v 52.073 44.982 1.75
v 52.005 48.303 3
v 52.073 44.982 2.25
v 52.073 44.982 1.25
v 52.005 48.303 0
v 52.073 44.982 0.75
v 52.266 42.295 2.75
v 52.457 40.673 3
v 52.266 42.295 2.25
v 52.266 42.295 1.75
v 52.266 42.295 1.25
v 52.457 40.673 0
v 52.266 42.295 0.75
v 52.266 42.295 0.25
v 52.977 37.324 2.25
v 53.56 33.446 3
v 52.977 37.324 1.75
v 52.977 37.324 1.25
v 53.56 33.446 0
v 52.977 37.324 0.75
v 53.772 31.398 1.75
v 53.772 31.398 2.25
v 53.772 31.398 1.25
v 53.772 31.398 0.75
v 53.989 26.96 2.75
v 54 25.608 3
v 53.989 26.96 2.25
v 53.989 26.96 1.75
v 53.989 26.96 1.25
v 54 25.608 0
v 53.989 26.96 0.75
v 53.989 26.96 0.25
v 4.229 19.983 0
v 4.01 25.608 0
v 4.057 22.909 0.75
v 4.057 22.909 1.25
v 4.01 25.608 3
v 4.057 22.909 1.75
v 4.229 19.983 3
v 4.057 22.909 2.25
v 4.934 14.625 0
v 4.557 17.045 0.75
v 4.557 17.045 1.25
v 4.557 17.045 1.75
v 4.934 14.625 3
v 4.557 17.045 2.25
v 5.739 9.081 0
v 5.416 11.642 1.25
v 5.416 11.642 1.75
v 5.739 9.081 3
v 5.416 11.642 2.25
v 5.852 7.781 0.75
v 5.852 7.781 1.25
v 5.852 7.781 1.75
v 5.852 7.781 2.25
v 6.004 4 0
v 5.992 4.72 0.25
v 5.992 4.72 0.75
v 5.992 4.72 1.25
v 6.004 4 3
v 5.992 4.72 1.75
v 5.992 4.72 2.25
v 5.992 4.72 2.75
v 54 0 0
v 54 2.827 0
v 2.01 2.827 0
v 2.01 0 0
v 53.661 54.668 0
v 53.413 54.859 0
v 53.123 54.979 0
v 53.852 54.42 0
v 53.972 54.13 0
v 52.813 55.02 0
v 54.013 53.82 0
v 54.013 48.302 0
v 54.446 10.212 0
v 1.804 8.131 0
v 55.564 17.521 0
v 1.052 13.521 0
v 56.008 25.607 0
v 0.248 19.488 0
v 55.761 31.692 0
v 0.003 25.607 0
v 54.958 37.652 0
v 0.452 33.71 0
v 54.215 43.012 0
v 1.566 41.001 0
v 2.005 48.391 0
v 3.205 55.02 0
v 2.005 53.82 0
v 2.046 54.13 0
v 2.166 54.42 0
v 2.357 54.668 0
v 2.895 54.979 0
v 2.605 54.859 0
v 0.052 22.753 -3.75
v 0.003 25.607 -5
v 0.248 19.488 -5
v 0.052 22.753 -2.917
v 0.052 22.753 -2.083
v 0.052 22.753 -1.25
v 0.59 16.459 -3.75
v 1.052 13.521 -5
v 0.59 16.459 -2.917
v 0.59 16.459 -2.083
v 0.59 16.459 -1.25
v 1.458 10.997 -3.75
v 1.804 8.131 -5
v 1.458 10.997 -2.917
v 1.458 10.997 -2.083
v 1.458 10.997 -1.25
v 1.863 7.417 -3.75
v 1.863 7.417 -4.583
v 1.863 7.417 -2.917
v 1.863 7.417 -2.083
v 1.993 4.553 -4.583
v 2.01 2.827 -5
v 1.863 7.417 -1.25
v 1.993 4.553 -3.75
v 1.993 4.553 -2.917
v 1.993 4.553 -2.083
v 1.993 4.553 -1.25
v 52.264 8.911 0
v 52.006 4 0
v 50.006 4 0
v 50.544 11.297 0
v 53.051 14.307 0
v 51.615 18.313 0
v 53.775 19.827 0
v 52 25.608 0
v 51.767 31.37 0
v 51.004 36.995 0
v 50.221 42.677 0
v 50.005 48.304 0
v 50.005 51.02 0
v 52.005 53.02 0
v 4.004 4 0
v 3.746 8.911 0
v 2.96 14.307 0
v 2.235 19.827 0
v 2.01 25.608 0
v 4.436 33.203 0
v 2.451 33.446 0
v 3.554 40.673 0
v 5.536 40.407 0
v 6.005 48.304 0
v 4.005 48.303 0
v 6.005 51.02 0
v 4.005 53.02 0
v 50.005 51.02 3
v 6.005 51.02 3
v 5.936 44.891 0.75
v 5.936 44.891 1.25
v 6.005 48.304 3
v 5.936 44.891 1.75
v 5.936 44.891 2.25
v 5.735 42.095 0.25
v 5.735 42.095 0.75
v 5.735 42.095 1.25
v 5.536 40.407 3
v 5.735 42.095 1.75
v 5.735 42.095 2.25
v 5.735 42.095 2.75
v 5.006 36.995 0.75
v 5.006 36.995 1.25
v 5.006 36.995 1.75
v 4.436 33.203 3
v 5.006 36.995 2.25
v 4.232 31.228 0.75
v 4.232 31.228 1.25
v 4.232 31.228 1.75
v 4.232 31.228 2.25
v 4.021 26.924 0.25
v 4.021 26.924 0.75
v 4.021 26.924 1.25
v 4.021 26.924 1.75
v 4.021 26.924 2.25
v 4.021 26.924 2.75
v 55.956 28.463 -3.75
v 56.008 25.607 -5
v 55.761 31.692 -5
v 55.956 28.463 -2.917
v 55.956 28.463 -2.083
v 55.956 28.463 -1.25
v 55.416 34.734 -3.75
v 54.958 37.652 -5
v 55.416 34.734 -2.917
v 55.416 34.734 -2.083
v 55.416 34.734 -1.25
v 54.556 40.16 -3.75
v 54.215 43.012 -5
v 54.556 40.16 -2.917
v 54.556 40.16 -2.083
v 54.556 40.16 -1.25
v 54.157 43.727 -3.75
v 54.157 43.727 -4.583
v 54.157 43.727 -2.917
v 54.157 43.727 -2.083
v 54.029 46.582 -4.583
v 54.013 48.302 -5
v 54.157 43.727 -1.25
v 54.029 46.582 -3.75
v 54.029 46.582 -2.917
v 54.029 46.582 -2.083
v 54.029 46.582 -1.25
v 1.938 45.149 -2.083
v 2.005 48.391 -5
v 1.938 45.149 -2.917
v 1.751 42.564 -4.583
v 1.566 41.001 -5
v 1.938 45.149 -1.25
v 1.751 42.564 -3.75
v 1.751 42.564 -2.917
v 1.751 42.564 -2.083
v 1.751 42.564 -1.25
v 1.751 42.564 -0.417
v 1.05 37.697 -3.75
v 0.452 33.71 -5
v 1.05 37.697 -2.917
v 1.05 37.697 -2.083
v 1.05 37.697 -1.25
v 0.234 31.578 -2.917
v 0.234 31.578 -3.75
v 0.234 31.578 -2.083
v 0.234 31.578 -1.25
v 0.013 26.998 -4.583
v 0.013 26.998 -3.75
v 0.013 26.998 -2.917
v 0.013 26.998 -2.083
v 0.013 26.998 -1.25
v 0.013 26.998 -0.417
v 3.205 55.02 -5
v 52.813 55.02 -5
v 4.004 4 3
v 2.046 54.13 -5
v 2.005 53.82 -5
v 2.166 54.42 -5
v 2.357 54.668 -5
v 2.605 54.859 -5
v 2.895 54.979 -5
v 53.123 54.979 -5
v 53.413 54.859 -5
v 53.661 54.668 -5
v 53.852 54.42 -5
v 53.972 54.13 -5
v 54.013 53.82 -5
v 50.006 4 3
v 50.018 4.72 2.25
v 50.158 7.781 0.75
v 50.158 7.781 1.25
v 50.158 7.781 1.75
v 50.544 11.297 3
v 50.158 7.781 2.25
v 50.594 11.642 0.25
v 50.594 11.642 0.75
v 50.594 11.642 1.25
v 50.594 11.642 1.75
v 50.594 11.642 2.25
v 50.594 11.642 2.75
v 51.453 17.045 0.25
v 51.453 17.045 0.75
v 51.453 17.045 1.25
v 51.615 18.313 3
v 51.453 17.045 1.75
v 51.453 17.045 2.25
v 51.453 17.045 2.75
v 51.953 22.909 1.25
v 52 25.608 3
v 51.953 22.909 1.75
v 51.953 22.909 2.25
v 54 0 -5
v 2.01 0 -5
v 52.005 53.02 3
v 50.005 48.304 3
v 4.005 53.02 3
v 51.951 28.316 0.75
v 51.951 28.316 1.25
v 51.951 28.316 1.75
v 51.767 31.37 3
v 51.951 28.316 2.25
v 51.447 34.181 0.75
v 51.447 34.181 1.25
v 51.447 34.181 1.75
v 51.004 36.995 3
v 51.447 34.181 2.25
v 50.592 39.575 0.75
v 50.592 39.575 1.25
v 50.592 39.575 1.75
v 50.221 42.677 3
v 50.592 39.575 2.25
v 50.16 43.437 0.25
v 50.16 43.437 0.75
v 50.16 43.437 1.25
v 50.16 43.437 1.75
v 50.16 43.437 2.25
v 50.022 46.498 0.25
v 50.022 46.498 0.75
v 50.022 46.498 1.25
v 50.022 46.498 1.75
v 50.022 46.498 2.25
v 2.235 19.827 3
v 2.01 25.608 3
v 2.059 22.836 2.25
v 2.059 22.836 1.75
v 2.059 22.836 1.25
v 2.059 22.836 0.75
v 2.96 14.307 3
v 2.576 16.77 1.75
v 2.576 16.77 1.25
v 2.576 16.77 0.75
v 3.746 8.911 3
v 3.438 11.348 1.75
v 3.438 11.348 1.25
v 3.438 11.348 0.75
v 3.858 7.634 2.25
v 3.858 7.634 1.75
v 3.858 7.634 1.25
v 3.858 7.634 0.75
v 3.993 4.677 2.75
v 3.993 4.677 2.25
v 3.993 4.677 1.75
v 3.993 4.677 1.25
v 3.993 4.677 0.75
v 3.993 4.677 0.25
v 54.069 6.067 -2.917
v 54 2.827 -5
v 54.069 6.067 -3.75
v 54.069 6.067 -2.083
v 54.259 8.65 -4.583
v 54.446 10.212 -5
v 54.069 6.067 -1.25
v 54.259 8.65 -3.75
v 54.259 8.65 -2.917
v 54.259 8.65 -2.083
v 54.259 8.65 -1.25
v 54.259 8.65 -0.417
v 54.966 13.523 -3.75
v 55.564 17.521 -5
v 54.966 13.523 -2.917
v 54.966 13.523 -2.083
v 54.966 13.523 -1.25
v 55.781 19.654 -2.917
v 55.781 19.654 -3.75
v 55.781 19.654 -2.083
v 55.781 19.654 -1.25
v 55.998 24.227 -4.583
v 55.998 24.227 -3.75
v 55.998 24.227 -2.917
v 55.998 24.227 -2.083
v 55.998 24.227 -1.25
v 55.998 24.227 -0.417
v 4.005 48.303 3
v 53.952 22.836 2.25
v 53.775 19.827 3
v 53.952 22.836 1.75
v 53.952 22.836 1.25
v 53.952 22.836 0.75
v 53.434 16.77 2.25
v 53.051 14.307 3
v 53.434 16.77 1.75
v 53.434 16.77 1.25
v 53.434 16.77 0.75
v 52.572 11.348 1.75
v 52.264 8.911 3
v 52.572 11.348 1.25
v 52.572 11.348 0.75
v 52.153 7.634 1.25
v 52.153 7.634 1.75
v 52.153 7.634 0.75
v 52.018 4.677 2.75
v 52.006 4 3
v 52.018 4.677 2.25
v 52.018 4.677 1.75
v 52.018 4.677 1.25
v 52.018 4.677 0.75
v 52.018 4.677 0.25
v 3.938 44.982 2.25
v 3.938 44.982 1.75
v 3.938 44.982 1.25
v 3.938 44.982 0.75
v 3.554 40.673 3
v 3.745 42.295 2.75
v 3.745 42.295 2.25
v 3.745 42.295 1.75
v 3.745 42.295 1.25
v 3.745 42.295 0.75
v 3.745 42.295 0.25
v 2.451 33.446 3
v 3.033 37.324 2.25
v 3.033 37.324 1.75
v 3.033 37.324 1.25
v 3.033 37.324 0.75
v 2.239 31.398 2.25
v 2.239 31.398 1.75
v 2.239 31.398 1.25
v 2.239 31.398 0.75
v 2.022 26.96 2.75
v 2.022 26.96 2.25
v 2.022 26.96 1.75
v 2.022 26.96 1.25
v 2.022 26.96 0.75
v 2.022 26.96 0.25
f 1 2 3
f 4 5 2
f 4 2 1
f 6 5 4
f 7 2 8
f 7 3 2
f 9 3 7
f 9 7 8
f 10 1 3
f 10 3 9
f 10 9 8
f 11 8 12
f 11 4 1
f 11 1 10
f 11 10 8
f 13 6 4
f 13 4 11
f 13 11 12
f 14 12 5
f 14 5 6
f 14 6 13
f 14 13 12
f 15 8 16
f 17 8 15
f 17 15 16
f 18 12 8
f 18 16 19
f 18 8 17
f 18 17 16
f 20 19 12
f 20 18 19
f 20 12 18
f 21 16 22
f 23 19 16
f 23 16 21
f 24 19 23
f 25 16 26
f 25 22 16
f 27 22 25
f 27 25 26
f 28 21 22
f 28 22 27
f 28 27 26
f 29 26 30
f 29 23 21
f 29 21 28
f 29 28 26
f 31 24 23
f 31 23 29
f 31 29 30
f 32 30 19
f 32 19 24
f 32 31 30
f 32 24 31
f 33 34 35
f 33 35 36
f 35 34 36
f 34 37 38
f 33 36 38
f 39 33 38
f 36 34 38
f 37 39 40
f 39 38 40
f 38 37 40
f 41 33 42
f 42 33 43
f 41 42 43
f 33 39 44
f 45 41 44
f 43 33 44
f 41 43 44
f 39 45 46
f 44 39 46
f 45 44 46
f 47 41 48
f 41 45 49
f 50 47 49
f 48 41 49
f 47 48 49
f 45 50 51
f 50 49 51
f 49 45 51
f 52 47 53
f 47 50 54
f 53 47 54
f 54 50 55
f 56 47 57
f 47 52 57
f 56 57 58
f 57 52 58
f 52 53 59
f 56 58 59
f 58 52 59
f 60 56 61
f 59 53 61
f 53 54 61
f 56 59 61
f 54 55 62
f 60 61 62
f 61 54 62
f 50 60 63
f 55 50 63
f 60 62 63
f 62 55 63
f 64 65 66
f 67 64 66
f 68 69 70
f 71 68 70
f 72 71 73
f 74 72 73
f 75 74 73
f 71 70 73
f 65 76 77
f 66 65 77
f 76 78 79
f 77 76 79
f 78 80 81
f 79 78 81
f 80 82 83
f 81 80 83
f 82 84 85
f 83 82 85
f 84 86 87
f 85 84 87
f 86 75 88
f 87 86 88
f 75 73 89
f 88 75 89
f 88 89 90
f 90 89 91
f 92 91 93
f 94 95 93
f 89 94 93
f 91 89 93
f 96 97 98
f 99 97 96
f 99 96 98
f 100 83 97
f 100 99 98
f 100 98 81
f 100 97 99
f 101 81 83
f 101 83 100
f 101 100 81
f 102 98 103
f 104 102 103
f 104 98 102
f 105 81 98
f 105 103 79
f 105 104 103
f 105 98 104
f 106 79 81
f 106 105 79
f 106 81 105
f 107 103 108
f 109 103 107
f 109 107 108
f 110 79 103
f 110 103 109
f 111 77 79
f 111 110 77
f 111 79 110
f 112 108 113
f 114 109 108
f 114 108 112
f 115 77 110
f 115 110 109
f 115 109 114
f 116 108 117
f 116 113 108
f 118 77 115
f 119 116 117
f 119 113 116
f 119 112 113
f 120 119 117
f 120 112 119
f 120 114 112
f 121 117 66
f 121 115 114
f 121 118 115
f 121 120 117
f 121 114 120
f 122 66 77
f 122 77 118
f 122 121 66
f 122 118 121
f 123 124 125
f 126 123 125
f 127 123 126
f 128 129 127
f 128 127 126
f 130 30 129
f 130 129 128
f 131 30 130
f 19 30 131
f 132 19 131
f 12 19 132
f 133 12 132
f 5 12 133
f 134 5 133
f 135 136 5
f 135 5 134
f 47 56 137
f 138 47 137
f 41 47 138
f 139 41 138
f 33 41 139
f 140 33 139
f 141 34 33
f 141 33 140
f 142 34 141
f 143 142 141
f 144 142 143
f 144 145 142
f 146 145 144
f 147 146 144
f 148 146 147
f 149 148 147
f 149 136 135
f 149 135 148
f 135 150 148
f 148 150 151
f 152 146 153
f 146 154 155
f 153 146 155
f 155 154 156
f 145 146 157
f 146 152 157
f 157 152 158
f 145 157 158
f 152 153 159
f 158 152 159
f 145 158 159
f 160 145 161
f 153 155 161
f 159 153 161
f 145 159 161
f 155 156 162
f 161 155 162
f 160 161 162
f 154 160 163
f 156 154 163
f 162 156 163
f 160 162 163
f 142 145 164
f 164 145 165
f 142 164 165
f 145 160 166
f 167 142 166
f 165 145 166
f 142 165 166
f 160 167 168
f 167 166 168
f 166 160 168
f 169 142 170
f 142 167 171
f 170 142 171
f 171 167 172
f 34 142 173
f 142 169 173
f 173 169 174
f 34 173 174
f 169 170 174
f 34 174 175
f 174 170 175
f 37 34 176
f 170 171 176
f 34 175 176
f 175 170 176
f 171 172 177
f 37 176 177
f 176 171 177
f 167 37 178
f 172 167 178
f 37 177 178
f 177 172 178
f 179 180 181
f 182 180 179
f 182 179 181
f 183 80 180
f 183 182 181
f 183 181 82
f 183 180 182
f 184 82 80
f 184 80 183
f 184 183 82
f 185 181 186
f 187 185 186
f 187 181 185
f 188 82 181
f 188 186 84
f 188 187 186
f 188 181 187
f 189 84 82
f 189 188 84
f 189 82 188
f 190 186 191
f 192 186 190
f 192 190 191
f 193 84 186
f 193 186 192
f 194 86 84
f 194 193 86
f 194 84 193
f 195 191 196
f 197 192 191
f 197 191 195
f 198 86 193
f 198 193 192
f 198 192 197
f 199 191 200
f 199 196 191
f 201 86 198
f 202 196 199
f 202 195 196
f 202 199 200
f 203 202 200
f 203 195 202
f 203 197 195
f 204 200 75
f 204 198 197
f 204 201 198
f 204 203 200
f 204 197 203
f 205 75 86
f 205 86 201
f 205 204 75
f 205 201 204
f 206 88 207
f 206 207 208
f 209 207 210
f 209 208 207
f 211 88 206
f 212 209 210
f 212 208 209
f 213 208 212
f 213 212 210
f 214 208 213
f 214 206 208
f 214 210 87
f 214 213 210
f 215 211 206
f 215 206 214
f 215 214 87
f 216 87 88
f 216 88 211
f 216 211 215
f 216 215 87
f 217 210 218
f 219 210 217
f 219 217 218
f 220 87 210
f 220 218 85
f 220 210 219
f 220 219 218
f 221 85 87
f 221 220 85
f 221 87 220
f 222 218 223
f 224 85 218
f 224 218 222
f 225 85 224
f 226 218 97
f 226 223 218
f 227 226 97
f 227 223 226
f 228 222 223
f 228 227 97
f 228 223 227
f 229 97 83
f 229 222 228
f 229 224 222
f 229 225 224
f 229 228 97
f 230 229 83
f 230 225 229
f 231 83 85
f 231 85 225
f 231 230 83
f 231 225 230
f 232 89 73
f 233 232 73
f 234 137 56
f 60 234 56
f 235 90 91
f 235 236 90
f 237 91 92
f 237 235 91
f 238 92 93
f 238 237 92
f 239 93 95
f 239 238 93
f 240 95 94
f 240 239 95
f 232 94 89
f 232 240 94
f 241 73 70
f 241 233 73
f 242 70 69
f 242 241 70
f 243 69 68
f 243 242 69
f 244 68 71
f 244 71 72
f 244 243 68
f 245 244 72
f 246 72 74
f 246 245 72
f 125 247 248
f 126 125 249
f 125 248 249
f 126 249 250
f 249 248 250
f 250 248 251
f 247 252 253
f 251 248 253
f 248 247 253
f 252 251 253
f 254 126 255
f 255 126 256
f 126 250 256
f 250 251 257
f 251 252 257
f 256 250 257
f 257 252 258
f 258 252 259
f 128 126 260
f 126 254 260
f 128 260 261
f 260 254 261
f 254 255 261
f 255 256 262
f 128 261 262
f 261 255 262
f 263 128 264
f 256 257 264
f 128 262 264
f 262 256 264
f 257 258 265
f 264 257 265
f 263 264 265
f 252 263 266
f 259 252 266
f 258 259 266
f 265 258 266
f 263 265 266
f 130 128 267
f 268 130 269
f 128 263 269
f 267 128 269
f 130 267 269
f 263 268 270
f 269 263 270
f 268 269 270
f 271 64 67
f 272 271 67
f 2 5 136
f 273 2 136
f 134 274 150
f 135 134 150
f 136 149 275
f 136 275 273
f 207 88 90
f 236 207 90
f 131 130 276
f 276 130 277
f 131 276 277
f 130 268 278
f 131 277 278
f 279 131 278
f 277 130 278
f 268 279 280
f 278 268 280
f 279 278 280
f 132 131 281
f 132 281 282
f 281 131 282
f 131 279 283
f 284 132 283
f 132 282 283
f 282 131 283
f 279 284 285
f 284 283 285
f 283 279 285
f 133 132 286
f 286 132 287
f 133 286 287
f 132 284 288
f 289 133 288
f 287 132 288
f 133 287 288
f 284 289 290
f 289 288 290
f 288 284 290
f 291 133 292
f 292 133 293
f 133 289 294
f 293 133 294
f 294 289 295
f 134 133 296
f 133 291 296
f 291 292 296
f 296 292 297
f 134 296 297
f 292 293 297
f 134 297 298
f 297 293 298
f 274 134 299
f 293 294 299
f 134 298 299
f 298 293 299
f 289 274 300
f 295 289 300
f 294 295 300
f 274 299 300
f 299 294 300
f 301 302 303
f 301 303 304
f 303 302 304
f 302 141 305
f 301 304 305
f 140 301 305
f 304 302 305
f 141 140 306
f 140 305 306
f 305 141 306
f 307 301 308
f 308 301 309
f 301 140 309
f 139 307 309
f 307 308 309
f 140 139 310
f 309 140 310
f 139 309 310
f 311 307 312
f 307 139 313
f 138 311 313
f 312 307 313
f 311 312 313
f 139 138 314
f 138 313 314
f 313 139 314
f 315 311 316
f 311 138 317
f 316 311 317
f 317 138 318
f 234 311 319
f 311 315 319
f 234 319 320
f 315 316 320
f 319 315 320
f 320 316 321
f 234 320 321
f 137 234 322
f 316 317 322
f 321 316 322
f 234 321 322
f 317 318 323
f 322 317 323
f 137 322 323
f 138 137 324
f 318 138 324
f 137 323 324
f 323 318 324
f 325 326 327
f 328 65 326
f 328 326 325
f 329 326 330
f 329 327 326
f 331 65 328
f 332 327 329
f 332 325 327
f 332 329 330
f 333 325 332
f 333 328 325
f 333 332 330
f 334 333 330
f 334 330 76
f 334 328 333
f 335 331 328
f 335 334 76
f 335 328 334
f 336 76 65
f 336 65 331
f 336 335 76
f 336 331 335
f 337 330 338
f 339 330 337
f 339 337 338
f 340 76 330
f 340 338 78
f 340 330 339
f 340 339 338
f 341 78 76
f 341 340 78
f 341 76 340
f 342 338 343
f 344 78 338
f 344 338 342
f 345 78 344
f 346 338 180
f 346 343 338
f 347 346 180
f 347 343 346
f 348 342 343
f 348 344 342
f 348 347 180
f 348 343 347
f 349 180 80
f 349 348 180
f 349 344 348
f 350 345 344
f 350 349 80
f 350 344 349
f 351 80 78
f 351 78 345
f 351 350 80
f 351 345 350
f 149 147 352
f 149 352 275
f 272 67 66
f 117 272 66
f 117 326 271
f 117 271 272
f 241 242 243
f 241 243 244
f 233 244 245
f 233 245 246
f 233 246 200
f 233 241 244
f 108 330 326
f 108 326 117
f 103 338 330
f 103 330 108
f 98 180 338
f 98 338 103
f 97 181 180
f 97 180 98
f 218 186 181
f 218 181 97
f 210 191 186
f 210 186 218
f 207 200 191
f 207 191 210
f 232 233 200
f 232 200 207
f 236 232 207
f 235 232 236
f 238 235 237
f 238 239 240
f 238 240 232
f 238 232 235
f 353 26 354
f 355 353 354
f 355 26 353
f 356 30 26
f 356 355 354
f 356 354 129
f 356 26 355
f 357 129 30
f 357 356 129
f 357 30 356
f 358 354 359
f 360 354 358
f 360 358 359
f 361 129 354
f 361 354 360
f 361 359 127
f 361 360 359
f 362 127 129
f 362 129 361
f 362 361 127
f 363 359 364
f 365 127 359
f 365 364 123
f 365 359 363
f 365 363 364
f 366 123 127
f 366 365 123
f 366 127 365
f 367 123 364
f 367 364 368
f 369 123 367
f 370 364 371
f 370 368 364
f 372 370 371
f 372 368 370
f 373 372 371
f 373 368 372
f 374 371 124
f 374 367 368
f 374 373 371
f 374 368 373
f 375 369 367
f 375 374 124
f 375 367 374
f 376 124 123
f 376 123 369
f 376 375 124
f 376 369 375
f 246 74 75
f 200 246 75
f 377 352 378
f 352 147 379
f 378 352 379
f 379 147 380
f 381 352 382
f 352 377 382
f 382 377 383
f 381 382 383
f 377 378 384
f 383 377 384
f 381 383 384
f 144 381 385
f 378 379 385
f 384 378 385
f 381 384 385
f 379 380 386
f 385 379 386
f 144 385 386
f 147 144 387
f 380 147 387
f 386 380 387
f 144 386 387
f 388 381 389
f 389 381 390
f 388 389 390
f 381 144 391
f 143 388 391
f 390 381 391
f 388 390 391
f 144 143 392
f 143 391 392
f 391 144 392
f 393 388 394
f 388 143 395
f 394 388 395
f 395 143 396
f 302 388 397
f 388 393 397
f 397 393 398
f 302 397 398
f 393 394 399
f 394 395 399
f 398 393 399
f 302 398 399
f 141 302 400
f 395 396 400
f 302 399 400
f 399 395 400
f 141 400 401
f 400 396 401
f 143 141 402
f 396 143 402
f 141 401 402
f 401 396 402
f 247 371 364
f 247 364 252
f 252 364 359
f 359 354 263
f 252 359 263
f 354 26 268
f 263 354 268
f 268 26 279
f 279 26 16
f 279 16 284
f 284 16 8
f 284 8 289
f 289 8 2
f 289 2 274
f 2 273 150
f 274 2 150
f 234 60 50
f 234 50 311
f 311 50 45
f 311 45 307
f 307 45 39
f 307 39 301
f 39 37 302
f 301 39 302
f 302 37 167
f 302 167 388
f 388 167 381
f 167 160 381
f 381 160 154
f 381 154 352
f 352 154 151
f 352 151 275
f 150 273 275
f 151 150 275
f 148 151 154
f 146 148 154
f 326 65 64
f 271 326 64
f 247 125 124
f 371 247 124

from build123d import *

# Parameters (mm, degrees)
BOSS_EXTRUDE1_DEPTH = 3
BOSS_EXTRUDE2_DEPTH = 5
FILLET7_R           = 1.2
CUT_EXTRUDE1_DEPTH  = 3
SKETCH9_W           = 49.989585209
SKETCH9_H           = 4
CUT_EXTRUDE2_DEPTH  = 3


with BuildPart() as part:
    # Sketch1 → Boss-Extrude1 (new body)
    with BuildSketch(Plane.XY):
        with BuildLine():
            Line((28.005207395, 53.01980246), (28.005207395, 0))
            Line((28.005207395, 0), (52, 0))
            Line((52, 0), (52, 2.9146477))
            add(Edge.make_bspline(
                [(54, 25.607527289), (54, 25.159169522), (53.994288647, 24.283360938), (53.944437462, 22.364816973), (53.80644817, 19.846772797), (53.457239701, 16.735076854), (52.97052622, 13.830588939), (52.553998709, 11.322953348), (52.298218213, 9.357304832), (52.147846123, 7.65276951), (52.064355406, 6.263182374), (52.020871116, 4.967378593), (52.003043675, 3.838316022), (52, 3.217882336), (52, 2.9146477)],
                knots=[0, 0, 0, 0, 0.062770413, 0.125540826, 0.251081651, 0.376622477, 0.502163302, 0.627704128, 0.753244954, 0.816015366, 0.878785779, 0.941556192, 0.972941398, 1.004326605, 1.004326605, 1.004326605, 1.004326605], degree=3))
            add(Edge.make_bspline(
                [(52.005207395, 48.302981133), (52.005032478, 47.999820298), (52.007704017, 47.379593464), (52.024798321, 46.250449069), (52.067339722, 44.954106741), (52.149671224, 43.56346429), (52.298420576, 41.857666135), (52.552090867, 39.891444934), (52.96513006, 37.389942775), (53.450176666, 34.49275873), (53.802371878, 31.383762001), (53.942389857, 28.862532812), (53.993270646, 26.94036246), (54.000260154, 26.05841638), (54, 25.607527289)],
                knots=[0, 0, 0, 0, 0.03125, 0.0625, 0.125, 0.1875, 0.25, 0.375, 0.5, 0.625, 0.75, 0.875, 0.9375, 1, 1, 1, 1], degree=3))
            Line((52.005207395, 48.302981133), (52.005207395, 53.01980246))
            Line((52.005207395, 53.01980246), (28.005207395, 53.01980246))
        make_face()
    boss_extrude1 = extrude(amount=BOSS_EXTRUDE1_DEPTH)

    # Mirror3: Boss-Extrude1 across plane
    add(boss_extrude1.mirror(Plane(origin=(28.005207395, 53.01980246, 3), x_dir=(0, 0, 1), z_dir=(1, 0, 0))))

    # Sketch8 → Cut-Extrude1 (cut)
    with BuildSketch(Plane.XY.offset(3)):
        with BuildLine():
            add(Edge.make_bspline(
                [(50, 2.9146477), (50, 3.224617501), (50.00310159, 3.857879479), (50.021398068, 5.017732873), (50.066192084, 6.354112543), (50.152974511, 7.799621089), (50.309893415, 9.578663007), (50.576683671, 11.626438016), (51.000941524, 14.177508821), (51.476890427, 17.021040342), (51.811938615, 20.009813081), (51.945914224, 22.44899251), (51.99445353, 24.316126277), (52, 25.170862419), (52, 25.608104268)],
                knots=[0, 0, 0, 0, 0.031386048, 0.062772096, 0.125544191, 0.188316287, 0.251088383, 0.376632574, 0.502176765, 0.627720957, 0.753265148, 0.878809339, 0.941581435, 1.004353531, 1.004353531, 1.004353531, 1.004353531], degree=3))
            add(Edge.make_bspline(
                [(52, 25.608104268), (52.000253167, 26.046883682), (51.993484197, 26.90461728), (51.943891847, 28.778318851), (51.808041336, 31.218153583), (51.470046418, 34.205615138), (50.995363085, 37.044048854), (50.574458042, 39.589997462), (50.309894836, 41.638165834), (50.154689303, 43.418158771), (50.069126253, 44.864352209), (50.025303755, 46.201018799), (50.007755855, 47.360709732), (50.005030547, 47.993698971), (50.005207395, 48.303554977)],
                knots=[-2.6659e-05, -2.6659e-05, -2.6659e-05, -2.6659e-05, 0.062473788, 0.124974235, 0.249975129, 0.374976024, 0.499976918, 0.624977813, 0.749978707, 0.812479154, 0.874979602, 0.937480049, 0.968730272, 0.999980496, 0.999980496, 0.999980496, 0.999980496], degree=3))
            Line((50.005207395, 48.303554977), (50.005207395, 51.01980246))
            Line((50.005207395, 51.01980246), (6.005207395, 51.01980246))
            Line((6.005207395, 51.01980246), (6.005207395, 48.303554977))
            add(Edge.make_bspline(
                [(6.005207395, 48.303554977), (6.005384244, 47.993698971), (6.002658935, 47.360709732), (5.985111036, 46.201018799), (5.941288538, 44.864352209), (5.855725488, 43.418158771), (5.700519955, 41.638165834), (5.435956749, 39.589997462), (5.015051706, 37.044048854), (4.540368373, 34.205615138), (4.202373454, 31.218153583), (4.066522943, 28.778318851), (4.016930594, 26.90461728), (4.010161624, 26.046883682), (4.010414791, 25.608104268)],
                knots=[1.9504e-05, 1.9504e-05, 1.9504e-05, 1.9504e-05, 0.031269728, 0.062519951, 0.125020398, 0.187520846, 0.250021293, 0.375022187, 0.500023082, 0.625023976, 0.750024871, 0.875025765, 0.937526212, 1.000026659, 1.000026659, 1.000026659, 1.000026659], degree=3))
            add(Edge.make_bspline(
                [(4.010414791, 25.608104268), (4.010414791, 25.170862419), (4.01596126, 24.316126277), (4.064500566, 22.44899251), (4.198476176, 20.009813081), (4.533524364, 17.021040342), (5.009473266, 14.177508821), (5.433731119, 11.626438016), (5.700521375, 9.578663007), (5.85744028, 7.799621089), (5.944222707, 6.354112543), (5.989016723, 5.017732873), (6.007313201, 3.857879479), (6.010414791, 3.224617501), (6.010414791, 2.9146477)],
                knots=[-2.6926e-05, -2.6926e-05, -2.6926e-05, -2.6926e-05, 0.06274517, 0.125517265, 0.251061457, 0.376605648, 0.50214984, 0.627694031, 0.753238222, 0.816010318, 0.878782414, 0.941554509, 0.972940557, 1.004326605, 1.004326605, 1.004326605, 1.004326605], degree=3))
            Line((6.010414791, 2.9146477), (6.010414791, 2))
            Line((6.010414791, 2), (50, 2))
            Line((50, 2), (50, 2.9146477))
        make_face()
    extrude(amount=-CUT_EXTRUDE1_DEPTH, mode=Mode.SUBTRACT)

    # Sketch9 → Cut-Extrude2 (cut)
    with BuildSketch(Plane.XY.offset(3)):
        with Locations((28.005207396, 2)):
            Rectangle(SKETCH9_W, SKETCH9_H)
    extrude(amount=-CUT_EXTRUDE2_DEPTH, mode=Mode.SUBTRACT)


with BuildPart() as body_2:
    # Sketch7 → Boss-Extrude2 (new body)
    with BuildSketch(Plane(origin=(0, 0, 0), x_dir=(-1, 0, 0), z_dir=(0, 0, -1))):
        with BuildLine():
            Line((-54, 0), (-2.010414791, 0))
            Line((-2.010414791, 0), (-2.010414791, 2.826684811))
            add(Edge.make_bspline(
                [(-0.002683346, 25.607288768), (-0.002684793, 25.146020337), (-0.008578722, 24.24562844), (-0.059938428, 22.268024705), (-0.202488874, 19.660991127), (-0.567266614, 16.413790423), (-1.066667382, 13.436844707), (-1.477049301, 10.963058588), (-1.722769034, 9.072207085), (-1.867151188, 7.435831234), (-1.947659771, 6.096972052), (-1.989995849, 4.836856595), (-2.007419417, 3.734309195), (-2.010415452, 3.12433851), (-2.010414791, 2.826684811)],
                knots=[0, 0, 0, 0, 0.062768763, 0.125537527, 0.251075054, 0.376612581, 0.502150108, 0.627687635, 0.753225162, 0.815993925, 0.878762689, 0.941531452, 0.972915834, 1.004300216, 1.004300216, 1.004300216, 1.004300216], degree=3))
            add(Edge.make_bspline(
                [(-2.005207395, 48.390705962), (-2.005278243, 48.093051791), (-2.002433581, 47.483064625), (-1.985280271, 46.380599958), (-1.94326327, 45.120314638), (-1.863091302, 43.781324125), (-1.719150663, 42.144803769), (-1.473867053, 40.253375363), (-1.064356832, 37.781388755), (-0.565858313, 34.803786135), (-0.201274319, 31.559573525), (-0.0594386, 28.949039647), (-0.008356002, 26.978566135), (-0.002573008, 26.070855192), (-0.002683346, 25.607288768)],
                knots=[-0.004037615, -0.004037615, -0.004037615, -0.004037615, 0.02733918, 0.058715975, 0.121469565, 0.184223155, 0.246976745, 0.372483925, 0.497991105, 0.623498285, 0.749005465, 0.874512645, 0.937266235, 1.000019825, 1.000019825, 1.000019825, 1.000019825], degree=3))
            Line((-2.005207395, 48.390705962), (-2.005207395, 55.01980246))
            Line((-2.005207395, 55.01980246), (-54.012879472, 55.01980246))
            Line((-54.012879472, 55.01980246), (-54.012879472, 48.302067423))
            add(Edge.make_bspline(
                [(-56.007672007, 25.60661437), (-56.007935943, 26.069619097), (-56.000730175, 26.975794719), (-55.948558309, 28.94642677), (-55.804371941, 31.549073699), (-55.437972012, 34.779609337), (-54.942570943, 37.735488393), (-54.537399908, 40.192530107), (-54.294622311, 42.076793881), (-54.152327736, 43.708398737), (-54.073226386, 45.043493604), (-54.031965992, 46.299521463), (-54.01532357, 47.39811745), (-54.012708414, 48.005596422), (-54.012879472, 48.302067423)],
                knots=[2.6056e-05, 2.6056e-05, 2.6056e-05, 2.6056e-05, 0.062525666, 0.125025277, 0.250024498, 0.375023719, 0.50002294, 0.625022162, 0.750021383, 0.812520993, 0.875020604, 0.937520215, 0.96877002, 1.000019825, 1.000019825, 1.000019825, 1.000019825], degree=3))
            add(Edge.make_bspline(
                [(-54, 2.826684811), (-54.000100255, 3.124370242), (-54.003315975, 3.734490867), (-54.021186519, 4.836633544), (-54.064120608, 6.096118397), (-54.145395663, 7.433673192), (-54.290876521, 9.068619606), (-54.53817552, 10.959362089), (-54.951355009, 13.438696093), (-55.451864372, 16.426002046), (-55.813260339, 19.674055379), (-55.952995542, 22.278826171), (-56.002879294, 24.248395477), (-56.0075171, 25.146652354), (-56.007672007, 25.60661437)],
                knots=[0, 0, 0, 0, 0.031513139, 0.063026278, 0.126052556, 0.189078835, 0.252105113, 0.378157669, 0.504210226, 0.630262782, 0.756315339, 0.882367895, 0.945394173, 1.008420451, 1.008420451, 1.008420451, 1.008420451], degree=3))
            Line((-54, 2.826684811), (-54, 0))
        make_face()
    extrude(amount=BOSS_EXTRUDE2_DEPTH)

    # Fillet7
    fillet7_edges = [body_2.edges().sort_by_distance(p)[0] for p in [
        (54.012879472, 55.01980246, -2.5),
        (2.005207395, 55.01980246, -2.5),
    ]]
    fillet(fillet7_edges, radius=FILLET7_R)


solid = Compound([part.part, body_2.part])
